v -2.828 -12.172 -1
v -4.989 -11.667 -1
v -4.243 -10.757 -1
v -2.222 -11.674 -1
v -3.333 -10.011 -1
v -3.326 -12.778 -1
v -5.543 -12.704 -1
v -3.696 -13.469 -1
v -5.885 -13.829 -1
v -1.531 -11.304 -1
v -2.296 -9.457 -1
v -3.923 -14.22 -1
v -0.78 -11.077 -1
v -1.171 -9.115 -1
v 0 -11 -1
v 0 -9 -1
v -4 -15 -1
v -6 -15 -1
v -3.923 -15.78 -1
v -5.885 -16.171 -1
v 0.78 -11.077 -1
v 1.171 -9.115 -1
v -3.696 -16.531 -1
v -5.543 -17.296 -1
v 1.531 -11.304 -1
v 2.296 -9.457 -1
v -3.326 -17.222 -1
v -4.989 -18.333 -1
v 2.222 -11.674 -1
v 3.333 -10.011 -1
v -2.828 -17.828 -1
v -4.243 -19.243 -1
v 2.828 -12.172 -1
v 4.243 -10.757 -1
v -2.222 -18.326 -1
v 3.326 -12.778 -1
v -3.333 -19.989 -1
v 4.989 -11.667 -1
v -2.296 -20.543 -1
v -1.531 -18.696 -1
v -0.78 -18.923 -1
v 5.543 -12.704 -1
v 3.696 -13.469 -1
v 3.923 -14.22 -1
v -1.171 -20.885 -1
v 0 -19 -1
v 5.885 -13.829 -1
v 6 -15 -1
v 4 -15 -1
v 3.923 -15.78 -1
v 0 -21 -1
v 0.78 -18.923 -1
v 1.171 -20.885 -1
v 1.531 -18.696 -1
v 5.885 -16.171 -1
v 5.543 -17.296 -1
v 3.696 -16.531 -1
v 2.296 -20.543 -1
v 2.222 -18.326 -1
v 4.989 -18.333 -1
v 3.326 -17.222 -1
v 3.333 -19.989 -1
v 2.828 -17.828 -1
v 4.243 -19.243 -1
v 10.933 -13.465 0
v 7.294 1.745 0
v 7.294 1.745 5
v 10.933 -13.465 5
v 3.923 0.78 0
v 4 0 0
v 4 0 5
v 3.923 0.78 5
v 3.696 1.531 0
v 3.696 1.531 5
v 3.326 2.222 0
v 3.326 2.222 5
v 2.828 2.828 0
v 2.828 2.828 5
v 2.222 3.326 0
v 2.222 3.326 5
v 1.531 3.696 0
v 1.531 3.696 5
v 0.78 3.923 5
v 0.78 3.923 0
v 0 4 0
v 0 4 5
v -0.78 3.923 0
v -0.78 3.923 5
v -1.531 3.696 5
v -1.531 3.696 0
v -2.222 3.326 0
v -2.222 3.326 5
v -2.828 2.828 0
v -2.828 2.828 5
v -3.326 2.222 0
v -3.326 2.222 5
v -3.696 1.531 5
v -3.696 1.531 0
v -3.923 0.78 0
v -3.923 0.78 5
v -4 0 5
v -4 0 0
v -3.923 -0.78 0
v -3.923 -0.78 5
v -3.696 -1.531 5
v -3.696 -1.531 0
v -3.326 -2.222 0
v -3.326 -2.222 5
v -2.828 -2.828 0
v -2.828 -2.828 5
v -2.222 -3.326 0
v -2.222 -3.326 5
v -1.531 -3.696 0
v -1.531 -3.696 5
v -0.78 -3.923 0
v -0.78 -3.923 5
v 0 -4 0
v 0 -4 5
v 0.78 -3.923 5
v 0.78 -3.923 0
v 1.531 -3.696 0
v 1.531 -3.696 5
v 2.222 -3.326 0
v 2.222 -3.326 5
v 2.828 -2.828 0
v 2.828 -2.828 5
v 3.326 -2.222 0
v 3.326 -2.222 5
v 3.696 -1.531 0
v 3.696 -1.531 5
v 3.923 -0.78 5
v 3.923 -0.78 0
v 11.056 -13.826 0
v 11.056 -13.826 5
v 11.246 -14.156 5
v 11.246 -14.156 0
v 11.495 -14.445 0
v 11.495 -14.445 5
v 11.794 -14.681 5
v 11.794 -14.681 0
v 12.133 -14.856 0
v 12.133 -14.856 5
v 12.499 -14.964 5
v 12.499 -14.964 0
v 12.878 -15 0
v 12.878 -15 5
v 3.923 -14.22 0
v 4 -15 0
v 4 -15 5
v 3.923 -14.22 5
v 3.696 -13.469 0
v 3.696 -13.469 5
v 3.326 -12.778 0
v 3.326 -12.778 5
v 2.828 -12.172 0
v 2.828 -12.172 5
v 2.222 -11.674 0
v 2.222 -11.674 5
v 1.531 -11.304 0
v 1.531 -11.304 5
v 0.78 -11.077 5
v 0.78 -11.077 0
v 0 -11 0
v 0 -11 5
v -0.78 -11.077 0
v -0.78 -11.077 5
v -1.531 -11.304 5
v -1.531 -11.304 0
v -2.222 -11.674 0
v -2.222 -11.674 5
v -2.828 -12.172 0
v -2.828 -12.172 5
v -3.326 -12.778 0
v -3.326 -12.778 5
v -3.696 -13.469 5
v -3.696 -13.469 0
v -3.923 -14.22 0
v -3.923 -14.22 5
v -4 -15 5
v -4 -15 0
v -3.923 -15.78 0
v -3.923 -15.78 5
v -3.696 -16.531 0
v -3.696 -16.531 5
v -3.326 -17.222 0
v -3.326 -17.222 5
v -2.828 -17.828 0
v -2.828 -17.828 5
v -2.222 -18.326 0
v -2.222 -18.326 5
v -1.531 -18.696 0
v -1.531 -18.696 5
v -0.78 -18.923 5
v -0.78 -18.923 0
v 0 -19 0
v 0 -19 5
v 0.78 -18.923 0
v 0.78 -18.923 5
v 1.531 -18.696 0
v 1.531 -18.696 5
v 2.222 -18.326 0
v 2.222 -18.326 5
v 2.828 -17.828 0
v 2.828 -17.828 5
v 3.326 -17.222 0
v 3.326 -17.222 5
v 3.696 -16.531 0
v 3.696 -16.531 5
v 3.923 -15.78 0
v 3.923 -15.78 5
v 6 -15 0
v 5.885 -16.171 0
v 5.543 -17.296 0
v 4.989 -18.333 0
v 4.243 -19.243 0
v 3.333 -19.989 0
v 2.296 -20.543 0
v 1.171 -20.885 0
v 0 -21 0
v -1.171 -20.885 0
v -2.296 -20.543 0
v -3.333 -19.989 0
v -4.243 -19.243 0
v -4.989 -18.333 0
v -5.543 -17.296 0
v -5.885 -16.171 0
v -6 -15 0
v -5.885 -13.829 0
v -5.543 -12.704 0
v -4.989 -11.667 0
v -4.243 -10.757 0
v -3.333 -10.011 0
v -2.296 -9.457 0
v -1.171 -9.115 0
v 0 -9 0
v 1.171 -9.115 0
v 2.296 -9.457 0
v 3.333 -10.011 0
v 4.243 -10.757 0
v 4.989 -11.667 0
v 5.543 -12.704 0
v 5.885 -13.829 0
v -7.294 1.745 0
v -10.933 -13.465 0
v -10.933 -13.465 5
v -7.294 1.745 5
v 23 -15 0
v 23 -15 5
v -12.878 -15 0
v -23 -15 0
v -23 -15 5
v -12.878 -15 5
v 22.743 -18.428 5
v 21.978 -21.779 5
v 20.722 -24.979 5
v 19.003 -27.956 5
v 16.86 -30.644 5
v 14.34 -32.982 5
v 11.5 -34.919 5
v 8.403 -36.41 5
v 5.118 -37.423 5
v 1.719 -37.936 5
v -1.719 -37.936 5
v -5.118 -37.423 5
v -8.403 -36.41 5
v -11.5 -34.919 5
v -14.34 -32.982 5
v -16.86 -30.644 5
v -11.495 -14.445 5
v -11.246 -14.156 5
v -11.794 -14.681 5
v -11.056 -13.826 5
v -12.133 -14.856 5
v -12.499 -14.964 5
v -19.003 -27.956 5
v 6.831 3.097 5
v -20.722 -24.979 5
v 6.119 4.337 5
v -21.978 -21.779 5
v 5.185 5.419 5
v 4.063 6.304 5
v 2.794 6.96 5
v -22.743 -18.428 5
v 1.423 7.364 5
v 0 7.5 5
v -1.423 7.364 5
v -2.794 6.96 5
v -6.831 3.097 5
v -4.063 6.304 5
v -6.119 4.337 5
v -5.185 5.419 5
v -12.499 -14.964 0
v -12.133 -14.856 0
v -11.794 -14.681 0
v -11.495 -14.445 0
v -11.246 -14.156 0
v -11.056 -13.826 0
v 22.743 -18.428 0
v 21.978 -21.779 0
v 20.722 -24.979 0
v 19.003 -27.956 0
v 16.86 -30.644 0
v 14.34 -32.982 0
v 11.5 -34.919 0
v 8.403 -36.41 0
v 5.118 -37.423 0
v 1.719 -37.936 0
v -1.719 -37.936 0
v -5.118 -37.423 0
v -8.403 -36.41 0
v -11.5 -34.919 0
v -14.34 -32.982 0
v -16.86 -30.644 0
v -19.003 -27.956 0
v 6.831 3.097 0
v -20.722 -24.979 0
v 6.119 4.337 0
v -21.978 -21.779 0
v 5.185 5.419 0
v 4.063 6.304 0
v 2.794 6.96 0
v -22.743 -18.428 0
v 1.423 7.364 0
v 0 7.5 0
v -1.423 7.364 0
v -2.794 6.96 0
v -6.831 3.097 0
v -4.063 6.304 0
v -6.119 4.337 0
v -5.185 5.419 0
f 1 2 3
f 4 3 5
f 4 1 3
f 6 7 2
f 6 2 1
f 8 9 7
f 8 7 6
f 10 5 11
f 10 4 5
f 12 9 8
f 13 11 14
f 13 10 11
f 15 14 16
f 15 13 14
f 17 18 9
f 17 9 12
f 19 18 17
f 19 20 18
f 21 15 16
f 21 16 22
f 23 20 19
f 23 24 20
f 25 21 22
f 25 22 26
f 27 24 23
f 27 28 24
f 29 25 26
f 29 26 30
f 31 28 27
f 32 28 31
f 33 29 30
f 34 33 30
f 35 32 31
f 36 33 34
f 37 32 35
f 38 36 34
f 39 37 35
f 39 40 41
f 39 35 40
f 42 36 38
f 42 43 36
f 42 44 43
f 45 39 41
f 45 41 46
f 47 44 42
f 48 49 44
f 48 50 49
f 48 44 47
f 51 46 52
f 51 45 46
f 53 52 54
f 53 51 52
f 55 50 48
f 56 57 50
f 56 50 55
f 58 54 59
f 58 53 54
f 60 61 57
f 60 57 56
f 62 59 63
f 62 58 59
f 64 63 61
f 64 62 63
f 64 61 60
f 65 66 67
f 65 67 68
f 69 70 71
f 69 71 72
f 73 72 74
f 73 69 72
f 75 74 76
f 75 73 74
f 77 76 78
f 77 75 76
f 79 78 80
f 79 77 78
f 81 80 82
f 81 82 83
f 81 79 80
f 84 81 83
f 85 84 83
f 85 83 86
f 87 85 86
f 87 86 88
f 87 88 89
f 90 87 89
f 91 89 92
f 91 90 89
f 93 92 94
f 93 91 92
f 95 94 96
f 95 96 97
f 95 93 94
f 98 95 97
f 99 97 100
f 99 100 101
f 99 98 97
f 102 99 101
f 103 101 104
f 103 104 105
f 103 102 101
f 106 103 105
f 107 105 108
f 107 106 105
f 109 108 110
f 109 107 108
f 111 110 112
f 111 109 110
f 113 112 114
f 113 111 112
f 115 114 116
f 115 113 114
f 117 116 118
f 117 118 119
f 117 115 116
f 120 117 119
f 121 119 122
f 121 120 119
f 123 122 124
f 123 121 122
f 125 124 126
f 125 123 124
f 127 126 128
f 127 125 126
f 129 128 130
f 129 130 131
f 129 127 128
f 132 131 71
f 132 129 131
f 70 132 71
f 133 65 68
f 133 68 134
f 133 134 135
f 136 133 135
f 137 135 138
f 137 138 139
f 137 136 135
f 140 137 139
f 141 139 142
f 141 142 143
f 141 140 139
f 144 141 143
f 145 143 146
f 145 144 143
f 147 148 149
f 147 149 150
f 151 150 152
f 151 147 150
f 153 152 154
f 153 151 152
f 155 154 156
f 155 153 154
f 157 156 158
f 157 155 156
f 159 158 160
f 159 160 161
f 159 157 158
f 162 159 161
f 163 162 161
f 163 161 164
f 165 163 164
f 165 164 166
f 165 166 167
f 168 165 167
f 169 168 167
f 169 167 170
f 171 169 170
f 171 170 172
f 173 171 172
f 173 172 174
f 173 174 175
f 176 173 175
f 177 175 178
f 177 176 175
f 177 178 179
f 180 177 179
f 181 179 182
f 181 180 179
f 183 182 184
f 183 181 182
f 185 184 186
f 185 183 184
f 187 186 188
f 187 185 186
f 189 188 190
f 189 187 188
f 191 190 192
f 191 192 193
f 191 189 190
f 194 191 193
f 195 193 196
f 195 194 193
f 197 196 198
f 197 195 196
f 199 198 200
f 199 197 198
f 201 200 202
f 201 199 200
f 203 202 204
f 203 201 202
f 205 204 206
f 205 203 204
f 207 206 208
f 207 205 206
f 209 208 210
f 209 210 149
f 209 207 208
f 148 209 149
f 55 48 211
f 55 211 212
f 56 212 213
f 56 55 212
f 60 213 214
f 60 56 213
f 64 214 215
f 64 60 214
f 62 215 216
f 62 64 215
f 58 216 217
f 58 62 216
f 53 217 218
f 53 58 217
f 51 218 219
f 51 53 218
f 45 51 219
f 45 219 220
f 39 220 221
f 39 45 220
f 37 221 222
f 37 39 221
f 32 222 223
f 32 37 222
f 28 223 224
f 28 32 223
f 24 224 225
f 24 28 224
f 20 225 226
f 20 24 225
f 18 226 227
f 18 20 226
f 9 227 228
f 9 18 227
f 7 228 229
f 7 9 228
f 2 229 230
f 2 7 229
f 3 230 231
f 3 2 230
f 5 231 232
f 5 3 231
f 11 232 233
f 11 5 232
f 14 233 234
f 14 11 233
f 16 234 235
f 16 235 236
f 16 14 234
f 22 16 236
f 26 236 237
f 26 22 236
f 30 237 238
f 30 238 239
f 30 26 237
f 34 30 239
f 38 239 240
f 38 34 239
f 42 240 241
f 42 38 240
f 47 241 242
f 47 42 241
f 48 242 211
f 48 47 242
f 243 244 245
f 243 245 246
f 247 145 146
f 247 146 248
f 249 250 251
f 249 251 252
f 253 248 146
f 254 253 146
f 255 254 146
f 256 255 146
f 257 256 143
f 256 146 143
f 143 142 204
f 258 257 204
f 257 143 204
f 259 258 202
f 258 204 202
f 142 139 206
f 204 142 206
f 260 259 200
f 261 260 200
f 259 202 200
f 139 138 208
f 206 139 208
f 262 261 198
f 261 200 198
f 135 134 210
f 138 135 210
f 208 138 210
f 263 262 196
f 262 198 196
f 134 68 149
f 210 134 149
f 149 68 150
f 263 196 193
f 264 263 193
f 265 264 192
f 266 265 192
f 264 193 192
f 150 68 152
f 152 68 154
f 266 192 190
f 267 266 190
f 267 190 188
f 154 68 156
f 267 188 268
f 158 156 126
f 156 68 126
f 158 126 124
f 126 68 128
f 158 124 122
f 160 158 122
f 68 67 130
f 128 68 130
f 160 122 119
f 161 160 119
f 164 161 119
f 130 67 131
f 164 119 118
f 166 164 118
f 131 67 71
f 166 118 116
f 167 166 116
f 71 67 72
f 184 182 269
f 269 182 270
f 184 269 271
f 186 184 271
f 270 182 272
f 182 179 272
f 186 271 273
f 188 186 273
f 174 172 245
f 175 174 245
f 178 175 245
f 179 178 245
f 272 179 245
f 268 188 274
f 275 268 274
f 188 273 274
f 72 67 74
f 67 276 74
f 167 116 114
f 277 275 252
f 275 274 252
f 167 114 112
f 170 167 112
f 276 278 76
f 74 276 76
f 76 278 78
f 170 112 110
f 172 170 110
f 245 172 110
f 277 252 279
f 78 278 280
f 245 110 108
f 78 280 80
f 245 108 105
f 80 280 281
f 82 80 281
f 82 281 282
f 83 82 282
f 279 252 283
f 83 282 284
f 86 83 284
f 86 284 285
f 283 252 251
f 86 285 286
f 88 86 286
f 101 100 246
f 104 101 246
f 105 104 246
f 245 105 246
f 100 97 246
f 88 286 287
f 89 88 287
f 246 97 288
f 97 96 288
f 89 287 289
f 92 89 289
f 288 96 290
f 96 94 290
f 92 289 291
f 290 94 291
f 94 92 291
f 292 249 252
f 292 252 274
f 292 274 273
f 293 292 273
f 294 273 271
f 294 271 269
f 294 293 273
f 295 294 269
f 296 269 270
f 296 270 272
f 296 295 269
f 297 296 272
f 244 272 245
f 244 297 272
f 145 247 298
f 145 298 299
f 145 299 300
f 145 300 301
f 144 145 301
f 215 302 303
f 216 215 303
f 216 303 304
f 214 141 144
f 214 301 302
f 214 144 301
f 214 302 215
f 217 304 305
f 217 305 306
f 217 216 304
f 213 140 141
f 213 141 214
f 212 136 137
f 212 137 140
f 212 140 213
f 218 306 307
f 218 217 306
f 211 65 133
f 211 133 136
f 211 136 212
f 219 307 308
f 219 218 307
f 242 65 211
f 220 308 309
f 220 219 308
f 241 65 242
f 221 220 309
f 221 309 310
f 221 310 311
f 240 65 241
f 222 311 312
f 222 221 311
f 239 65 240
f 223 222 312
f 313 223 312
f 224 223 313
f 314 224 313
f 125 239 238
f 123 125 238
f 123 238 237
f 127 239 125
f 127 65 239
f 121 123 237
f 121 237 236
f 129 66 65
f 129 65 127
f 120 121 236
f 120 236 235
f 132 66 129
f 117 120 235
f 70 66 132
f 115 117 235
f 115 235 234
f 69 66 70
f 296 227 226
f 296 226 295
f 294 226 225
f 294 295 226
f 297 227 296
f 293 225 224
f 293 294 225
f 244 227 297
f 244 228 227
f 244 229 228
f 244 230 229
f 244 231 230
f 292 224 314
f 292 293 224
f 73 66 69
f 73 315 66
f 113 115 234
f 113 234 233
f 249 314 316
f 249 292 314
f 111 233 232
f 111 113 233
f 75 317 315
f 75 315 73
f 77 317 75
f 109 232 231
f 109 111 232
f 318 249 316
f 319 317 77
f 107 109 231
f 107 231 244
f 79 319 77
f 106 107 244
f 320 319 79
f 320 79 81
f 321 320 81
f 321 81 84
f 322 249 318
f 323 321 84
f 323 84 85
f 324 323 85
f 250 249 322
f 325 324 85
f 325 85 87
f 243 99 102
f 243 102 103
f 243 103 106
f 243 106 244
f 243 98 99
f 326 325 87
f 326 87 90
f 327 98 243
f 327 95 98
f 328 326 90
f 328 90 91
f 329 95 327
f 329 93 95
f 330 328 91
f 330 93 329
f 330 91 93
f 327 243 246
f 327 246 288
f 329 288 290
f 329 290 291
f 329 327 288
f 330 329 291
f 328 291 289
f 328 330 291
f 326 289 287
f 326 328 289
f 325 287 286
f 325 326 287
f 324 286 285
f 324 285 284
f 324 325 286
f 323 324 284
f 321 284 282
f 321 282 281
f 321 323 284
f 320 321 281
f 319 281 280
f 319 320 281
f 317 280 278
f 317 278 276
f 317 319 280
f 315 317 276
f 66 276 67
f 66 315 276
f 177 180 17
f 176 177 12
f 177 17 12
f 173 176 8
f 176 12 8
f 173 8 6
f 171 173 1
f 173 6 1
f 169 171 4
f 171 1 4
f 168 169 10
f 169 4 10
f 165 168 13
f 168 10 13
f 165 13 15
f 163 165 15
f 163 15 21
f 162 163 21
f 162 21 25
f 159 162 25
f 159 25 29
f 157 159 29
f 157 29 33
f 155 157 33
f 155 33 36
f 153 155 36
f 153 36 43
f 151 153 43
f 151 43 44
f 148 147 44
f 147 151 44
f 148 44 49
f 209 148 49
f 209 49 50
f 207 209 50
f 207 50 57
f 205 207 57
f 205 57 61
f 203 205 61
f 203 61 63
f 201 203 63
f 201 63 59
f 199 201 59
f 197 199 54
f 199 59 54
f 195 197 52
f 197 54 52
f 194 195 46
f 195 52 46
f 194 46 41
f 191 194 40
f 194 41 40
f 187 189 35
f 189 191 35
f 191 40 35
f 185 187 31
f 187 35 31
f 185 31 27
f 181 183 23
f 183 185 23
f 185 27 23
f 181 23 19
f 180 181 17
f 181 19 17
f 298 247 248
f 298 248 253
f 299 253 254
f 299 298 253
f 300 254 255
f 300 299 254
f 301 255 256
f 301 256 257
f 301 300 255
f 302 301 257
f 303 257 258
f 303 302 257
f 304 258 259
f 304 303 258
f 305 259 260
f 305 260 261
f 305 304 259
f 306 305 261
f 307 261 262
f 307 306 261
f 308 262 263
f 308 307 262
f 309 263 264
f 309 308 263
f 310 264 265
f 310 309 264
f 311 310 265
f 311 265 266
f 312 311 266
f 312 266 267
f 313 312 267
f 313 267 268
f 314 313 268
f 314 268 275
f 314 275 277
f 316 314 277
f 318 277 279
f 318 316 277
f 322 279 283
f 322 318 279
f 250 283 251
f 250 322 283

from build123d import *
from build123d.topology import SkipClean

# Parameters (mm, degrees)
SKETCH1_R           = 4
BOSS_EXTRUDE1_DEPTH = 5
BOSS_EXTRUDE2_START = 1
SKETCH3_R           = 6
SKETCH3_R_2         = 4
BOSS_EXTRUDE2_DEPTH = 1


with BuildPart() as part:
    # Sketch1 → Boss-Extrude1 (new body)
    with BuildSketch(Plane.XY):
        with BuildLine():
            Line((-23, -15), (-12.87798214, -15))
            ThreePointArc((-12.87798214, -15), (-11.639160434, -14.570134001), (-10.932866059, -13.465320781))
            Line((-10.932866059, -13.465320781), (-7.294185306, 1.74495293))
            ThreePointArc((-7.294185306, 1.74495293), (0, 7.5), (7.294185306, 1.74495293))
            Line((7.294185306, 1.74495293), (10.932866059, -13.465320781))
            ThreePointArc((10.932866059, -13.465320781), (11.639160434, -14.570134001), (12.87798214, -15))
            Line((12.87798214, -15), (23, -15))
            ThreePointArc((23, -15), (0, -38), (-23, -15))
        make_face()
        Circle(SKETCH1_R, mode=Mode.SUBTRACT)
        with Locations((0, -15)):
            Circle(SKETCH1_R, mode=Mode.SUBTRACT)
    extrude(amount=BOSS_EXTRUDE1_DEPTH)

    # Sketch3 → Boss-Extrude2 (add)
    with SkipClean():  # the faces are left unmerged after this step: merging them gives an invalid solid
        with BuildSketch(Plane(origin=(0, 0, 0), x_dir=(-1, 0, 0), z_dir=(0, 0, -1)).offset(BOSS_EXTRUDE2_START)):
            with Locations(Location((0, -15, 0), (0, 0, 180))):
                Circle(SKETCH3_R)
            with Locations((0, -15)):
                Circle(SKETCH3_R_2, mode=Mode.SUBTRACT)
        extrude(amount=-BOSS_EXTRUDE2_DEPTH)


solid = part.part
